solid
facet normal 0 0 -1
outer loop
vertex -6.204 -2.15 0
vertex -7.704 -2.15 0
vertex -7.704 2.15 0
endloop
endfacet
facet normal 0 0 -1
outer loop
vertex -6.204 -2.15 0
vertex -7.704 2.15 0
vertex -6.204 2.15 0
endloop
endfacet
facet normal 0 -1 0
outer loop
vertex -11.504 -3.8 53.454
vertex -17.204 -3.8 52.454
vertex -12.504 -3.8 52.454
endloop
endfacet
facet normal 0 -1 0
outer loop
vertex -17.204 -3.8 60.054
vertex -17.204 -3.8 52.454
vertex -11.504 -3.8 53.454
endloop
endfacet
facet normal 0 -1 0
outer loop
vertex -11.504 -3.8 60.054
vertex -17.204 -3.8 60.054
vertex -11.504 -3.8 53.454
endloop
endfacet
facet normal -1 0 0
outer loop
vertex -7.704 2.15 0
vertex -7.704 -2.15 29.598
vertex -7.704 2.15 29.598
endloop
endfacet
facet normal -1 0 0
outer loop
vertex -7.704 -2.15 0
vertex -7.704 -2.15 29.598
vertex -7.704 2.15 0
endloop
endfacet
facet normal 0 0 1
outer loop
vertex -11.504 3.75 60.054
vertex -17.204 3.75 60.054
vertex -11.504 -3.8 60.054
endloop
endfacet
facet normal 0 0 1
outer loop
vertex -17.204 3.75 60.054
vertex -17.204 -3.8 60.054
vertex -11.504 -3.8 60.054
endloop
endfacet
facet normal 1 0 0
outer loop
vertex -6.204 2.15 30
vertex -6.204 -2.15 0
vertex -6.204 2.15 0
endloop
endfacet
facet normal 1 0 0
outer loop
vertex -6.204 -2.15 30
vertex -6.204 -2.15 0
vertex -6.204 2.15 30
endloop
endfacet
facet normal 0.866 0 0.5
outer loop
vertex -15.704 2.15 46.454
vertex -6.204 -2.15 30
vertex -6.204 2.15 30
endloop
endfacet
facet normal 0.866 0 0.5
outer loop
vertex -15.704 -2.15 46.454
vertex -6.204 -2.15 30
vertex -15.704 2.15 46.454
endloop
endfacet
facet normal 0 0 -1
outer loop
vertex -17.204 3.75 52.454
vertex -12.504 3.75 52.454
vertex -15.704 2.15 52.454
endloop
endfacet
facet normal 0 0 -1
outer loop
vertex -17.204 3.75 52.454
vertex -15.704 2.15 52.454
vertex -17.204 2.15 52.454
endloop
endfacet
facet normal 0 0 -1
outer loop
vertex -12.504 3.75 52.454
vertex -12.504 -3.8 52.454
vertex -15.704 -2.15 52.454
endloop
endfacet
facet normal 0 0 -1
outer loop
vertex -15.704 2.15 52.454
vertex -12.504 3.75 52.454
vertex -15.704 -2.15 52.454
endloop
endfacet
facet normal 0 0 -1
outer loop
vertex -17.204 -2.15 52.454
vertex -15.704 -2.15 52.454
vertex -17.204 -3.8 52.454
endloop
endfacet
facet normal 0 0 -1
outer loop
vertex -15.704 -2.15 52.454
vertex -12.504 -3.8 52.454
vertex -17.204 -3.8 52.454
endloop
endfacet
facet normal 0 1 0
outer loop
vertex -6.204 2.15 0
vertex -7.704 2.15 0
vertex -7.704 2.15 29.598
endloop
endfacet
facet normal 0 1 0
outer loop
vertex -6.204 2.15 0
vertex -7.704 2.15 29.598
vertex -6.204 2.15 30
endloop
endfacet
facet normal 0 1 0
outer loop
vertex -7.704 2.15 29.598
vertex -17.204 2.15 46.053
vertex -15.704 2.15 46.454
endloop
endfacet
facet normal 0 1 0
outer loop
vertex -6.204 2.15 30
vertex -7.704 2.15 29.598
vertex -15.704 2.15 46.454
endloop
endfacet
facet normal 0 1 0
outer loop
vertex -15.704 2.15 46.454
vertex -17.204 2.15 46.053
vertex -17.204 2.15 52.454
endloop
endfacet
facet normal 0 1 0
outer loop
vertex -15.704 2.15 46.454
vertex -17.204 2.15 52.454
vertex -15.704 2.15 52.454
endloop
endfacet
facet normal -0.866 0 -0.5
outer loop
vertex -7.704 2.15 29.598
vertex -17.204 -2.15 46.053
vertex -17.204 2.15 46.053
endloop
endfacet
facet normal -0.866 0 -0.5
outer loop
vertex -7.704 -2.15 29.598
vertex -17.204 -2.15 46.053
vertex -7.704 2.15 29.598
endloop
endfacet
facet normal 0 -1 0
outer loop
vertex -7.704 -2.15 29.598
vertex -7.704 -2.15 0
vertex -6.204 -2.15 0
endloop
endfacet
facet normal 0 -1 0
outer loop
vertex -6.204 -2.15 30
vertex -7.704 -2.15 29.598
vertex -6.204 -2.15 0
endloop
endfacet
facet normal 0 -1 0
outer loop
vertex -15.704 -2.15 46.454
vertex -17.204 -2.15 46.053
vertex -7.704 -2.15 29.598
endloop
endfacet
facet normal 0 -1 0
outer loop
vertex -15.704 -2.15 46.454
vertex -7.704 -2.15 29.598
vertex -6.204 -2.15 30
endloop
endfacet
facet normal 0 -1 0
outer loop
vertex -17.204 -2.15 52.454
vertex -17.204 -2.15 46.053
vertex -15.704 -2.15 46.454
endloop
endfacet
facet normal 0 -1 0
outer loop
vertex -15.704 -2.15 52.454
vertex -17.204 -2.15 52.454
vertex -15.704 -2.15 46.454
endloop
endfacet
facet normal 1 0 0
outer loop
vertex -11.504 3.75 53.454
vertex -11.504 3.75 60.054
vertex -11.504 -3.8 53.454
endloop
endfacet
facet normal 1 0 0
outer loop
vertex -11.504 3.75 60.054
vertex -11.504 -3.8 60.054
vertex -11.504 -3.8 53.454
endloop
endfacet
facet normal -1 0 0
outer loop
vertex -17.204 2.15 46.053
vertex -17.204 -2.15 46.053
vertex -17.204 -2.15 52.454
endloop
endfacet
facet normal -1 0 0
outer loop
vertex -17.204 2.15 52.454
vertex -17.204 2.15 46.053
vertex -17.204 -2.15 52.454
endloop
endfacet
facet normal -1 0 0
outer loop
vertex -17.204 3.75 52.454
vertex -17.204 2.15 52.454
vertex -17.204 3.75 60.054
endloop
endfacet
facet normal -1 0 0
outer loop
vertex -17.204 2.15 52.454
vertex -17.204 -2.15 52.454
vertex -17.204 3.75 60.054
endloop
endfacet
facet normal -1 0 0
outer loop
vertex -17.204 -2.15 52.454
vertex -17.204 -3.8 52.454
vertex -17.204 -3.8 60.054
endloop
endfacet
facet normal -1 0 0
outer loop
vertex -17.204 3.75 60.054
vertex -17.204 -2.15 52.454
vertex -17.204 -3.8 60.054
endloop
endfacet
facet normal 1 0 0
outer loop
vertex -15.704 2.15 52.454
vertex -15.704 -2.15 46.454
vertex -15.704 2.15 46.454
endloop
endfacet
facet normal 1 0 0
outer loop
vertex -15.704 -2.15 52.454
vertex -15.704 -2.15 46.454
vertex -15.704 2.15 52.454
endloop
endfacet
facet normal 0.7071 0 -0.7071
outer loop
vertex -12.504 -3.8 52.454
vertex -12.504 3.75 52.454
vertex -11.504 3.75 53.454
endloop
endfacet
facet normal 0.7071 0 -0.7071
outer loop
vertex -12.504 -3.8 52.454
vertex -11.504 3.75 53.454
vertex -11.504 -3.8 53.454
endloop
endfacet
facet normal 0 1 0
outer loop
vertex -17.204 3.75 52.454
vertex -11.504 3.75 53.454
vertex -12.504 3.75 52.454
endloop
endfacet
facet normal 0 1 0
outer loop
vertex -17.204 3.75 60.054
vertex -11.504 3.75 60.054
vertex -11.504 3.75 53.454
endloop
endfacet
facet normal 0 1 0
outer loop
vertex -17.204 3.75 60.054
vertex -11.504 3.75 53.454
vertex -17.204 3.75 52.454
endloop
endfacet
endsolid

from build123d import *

# Parameters (mm, degrees)
F1_DEPTH = 2.15
F2_W     = 5.7
F2_H     = 7.6
F3_DEPTH = 1.65
F5_DEPTH = 1.6
F6_SIZE  = 1


with BuildPart() as f1:
    # F0 (on Front) → F1 (new body, symmetric)
    with BuildSketch(Plane.XZ):
        Polygon((-7.7040915435, 0), (-6.2040915435, 0), (-6.2040915435, 30), (-15.7040915435, 46.4544826719), (-15.7040915435, 52.4544826719), (-11.5040915435, 52.4544826719), (-11.5040915435, 60.0544826719), (-17.2040915435, 60.0544826719), (-17.2040915435, 46.0525588833), (-7.7040915435, 29.5980762114), align=None)
    extrude(amount=F1_DEPTH, both=True)

    # F2 (on face) + F1_face1 (on face) → F3 (join)
    with BuildSketch(Plane.XZ.offset(2.15)):
        with Locations((-14.3540915435, 56.2544826719)):
            Rectangle(F2_W, F2_H)
    with BuildSketch(Plane(origin=(-11.28016615, 2.15, 36.9237290057), x_dir=(1, 0, 0), z_dir=(0, 1, 0))):
        Polygon((5.0760746065, 36.9237290057), (3.5760746065, 36.9237290057), (3.5760746065, 7.3256527943), (-5.9239253935, -9.1288298776), (-5.9239253935, -23.1307536662), (-0.2239253935, -23.1307536662), (-0.2239253935, -15.5307536662), (-4.4239253935, -15.5307536662), (-4.4239253935, -9.5307536662), (5.0760746065, 6.9237290057), align=None)
    extrude(amount=F3_DEPTH, dir=(0, -1, 0))

    # F4 (on face) → F5 (join)
    with BuildSketch(Plane(origin=(0, 2.15, 0), x_dir=(-1, 0, 0), z_dir=(0, 1, 0))):
        Polygon((17.2040915435, 52.4544826719), (17.2040915435, 60.0544826719), (11.5040915435, 60.0544826719), (11.5040915435, 52.4544826719), (15.7040915435, 52.4544826719), align=None)
    extrude(amount=F5_DEPTH)

    # F6
    f6_edges = [f1.edges().sort_by_distance(p)[0] for p in [
        (-11.504092, -0.025, 52.454483),
    ]]
    chamfer(f6_edges, length=F6_SIZE)


solid = f1.part
